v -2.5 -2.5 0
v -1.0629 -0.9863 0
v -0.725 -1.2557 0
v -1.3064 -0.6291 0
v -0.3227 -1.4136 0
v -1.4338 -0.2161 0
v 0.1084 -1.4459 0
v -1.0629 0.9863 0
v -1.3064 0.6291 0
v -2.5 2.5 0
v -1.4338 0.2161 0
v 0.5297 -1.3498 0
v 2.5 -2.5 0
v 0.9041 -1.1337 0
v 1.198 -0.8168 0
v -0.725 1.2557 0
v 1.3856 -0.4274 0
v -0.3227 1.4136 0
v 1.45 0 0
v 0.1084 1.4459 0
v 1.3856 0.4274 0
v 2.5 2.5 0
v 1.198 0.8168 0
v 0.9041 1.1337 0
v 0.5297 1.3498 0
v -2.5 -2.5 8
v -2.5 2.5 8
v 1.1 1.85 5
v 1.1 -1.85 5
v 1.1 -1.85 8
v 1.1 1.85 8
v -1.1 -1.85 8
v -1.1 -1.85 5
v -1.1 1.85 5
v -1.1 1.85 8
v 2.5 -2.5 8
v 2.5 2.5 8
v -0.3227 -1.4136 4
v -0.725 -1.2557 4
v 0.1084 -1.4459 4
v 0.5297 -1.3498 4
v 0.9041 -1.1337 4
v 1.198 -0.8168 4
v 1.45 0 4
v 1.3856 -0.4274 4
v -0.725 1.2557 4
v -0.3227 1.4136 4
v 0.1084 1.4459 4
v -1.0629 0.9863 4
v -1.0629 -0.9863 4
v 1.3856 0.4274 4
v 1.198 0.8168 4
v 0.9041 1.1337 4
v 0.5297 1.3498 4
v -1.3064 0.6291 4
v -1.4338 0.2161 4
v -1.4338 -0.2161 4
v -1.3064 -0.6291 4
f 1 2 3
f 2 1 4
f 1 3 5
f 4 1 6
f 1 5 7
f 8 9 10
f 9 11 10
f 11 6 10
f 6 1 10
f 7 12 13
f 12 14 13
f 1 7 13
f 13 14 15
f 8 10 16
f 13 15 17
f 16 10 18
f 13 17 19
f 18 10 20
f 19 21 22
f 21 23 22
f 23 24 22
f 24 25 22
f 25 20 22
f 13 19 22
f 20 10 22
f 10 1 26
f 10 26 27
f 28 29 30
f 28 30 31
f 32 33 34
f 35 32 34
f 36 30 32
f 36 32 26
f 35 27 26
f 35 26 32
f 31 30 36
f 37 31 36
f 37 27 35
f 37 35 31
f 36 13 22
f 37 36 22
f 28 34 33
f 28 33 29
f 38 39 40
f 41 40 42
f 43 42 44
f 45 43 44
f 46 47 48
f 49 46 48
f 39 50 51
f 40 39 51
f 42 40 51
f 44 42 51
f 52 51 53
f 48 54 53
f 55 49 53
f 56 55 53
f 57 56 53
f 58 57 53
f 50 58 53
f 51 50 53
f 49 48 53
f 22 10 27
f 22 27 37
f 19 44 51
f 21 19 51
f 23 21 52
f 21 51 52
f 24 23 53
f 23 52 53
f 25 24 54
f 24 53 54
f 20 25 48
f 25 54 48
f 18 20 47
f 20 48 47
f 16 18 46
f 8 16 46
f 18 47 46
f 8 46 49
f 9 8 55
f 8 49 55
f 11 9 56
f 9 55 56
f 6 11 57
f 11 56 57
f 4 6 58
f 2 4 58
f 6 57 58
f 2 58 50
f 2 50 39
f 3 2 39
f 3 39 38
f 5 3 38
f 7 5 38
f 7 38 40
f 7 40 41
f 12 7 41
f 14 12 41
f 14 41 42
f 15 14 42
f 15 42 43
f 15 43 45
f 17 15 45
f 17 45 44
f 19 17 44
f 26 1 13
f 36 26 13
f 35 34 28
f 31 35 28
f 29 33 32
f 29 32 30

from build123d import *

# Parameters (mm, degrees)
F0_W     = 5
F0_H     = 5
F1_DEPTH = 5
F2_R     = 1.45
F3_DEPTH = 5.001
F4_W     = 5
F4_H     = 5
F4_W_2   = 2.2
F4_H_2   = 3.7
F5_DEPTH = 3
F6_DEPTH = 1


with BuildPart() as f1:
    # F0 (on Top) → F1 (new body)
    with BuildSketch(Plane.XY):
        Rectangle(F0_W, F0_H)
    extrude(amount=F1_DEPTH)

    # F2 (on face) → F3 (cut, through all)
    with BuildSketch(Plane.XY.offset(5)):
        Circle(F2_R)
    extrude(amount=-F3_DEPTH, mode=Mode.SUBTRACT)

    # F4 (on face) → F5 (join)
    with BuildSketch(Plane.XY.offset(5)):
        Rectangle(F4_W, F4_H)
        Rectangle(F4_W_2, F4_H_2, mode=Mode.SUBTRACT)
    extrude(amount=F5_DEPTH)

    # F4 (on face) → F6 (join)
    with BuildSketch(Plane.XY.offset(5)):
        Rectangle(F4_W, F4_H)
        with BuildLine():
            Line((1.1, -0.9447221814), (1.1, -1.85))
            Line((1.1, -1.85), (-1.1, -1.85))
            Line((-1.1, -1.85), (-1.1, -0.9447221814))
            ThreePointArc((-1.1, -0.9447221814), (-1.45, 0), (-1.1, 0.9447221814))
            Line((-1.1, 0.9447221814), (-1.1, 1.85))
            Line((-1.1, 1.85), (1.1, 1.85))
            Line((1.1, 1.85), (1.1, 0.9447221814))
            ThreePointArc((1.1, 0.9447221814), (1.3596874641, 0.503736042), (1.45, 0))
            ThreePointArc((1.45, 0), (1.3596874641, -0.503736042), (1.1, -0.9447221814))
        make_face(mode=Mode.SUBTRACT)
        with BuildLine():
            ThreePointArc((-1.1, 0.9447221814), (0, 1.45), (1.1, 0.9447221814))
            Line((1.1, 0.9447221814), (1.1, 1.85))
            Line((1.1, 1.85), (-1.1, 1.85))
            Line((-1.1, 1.85), (-1.1, 0.9447221814))
        make_face()
        with BuildLine():
            ThreePointArc((-1.1, 0.9447221814), (-1.45, 0), (-1.1, -0.9447221814))
            Line((-1.1, -0.9447221814), (-1.1, 0.9447221814))
        make_face()
        with BuildLine():
            ThreePointArc((-1.1, -0.9447221814), (0, -1.45), (1.1, -0.9447221814))
            Line((1.1, -0.9447221814), (1.1, 0.9447221814))
            ThreePointArc((1.1, 0.9447221814), (0, 1.45), (-1.1, 0.9447221814))
            Line((-1.1, 0.9447221814), (-1.1, -0.9447221814))
        make_face()
        with BuildLine():
            Line((1.1, 0.9447221814), (1.1, -0.9447221814))
            ThreePointArc((1.1, -0.9447221814), (1.3596874641, -0.503736042), (1.45, 0))
            ThreePointArc((1.45, 0), (1.3596874641, 0.503736042), (1.1, 0.9447221814))
        make_face()
        with BuildLine():
            Line((-1.1, -1.85), (1.1, -1.85))
            Line((1.1, -1.85), (1.1, -0.9447221814))
            ThreePointArc((1.1, -0.9447221814), (0, -1.45), (-1.1, -0.9447221814))
            Line((-1.1, -0.9447221814), (-1.1, -1.85))
        make_face()
    extrude(amount=-F6_DEPTH)


solid = f1.part
